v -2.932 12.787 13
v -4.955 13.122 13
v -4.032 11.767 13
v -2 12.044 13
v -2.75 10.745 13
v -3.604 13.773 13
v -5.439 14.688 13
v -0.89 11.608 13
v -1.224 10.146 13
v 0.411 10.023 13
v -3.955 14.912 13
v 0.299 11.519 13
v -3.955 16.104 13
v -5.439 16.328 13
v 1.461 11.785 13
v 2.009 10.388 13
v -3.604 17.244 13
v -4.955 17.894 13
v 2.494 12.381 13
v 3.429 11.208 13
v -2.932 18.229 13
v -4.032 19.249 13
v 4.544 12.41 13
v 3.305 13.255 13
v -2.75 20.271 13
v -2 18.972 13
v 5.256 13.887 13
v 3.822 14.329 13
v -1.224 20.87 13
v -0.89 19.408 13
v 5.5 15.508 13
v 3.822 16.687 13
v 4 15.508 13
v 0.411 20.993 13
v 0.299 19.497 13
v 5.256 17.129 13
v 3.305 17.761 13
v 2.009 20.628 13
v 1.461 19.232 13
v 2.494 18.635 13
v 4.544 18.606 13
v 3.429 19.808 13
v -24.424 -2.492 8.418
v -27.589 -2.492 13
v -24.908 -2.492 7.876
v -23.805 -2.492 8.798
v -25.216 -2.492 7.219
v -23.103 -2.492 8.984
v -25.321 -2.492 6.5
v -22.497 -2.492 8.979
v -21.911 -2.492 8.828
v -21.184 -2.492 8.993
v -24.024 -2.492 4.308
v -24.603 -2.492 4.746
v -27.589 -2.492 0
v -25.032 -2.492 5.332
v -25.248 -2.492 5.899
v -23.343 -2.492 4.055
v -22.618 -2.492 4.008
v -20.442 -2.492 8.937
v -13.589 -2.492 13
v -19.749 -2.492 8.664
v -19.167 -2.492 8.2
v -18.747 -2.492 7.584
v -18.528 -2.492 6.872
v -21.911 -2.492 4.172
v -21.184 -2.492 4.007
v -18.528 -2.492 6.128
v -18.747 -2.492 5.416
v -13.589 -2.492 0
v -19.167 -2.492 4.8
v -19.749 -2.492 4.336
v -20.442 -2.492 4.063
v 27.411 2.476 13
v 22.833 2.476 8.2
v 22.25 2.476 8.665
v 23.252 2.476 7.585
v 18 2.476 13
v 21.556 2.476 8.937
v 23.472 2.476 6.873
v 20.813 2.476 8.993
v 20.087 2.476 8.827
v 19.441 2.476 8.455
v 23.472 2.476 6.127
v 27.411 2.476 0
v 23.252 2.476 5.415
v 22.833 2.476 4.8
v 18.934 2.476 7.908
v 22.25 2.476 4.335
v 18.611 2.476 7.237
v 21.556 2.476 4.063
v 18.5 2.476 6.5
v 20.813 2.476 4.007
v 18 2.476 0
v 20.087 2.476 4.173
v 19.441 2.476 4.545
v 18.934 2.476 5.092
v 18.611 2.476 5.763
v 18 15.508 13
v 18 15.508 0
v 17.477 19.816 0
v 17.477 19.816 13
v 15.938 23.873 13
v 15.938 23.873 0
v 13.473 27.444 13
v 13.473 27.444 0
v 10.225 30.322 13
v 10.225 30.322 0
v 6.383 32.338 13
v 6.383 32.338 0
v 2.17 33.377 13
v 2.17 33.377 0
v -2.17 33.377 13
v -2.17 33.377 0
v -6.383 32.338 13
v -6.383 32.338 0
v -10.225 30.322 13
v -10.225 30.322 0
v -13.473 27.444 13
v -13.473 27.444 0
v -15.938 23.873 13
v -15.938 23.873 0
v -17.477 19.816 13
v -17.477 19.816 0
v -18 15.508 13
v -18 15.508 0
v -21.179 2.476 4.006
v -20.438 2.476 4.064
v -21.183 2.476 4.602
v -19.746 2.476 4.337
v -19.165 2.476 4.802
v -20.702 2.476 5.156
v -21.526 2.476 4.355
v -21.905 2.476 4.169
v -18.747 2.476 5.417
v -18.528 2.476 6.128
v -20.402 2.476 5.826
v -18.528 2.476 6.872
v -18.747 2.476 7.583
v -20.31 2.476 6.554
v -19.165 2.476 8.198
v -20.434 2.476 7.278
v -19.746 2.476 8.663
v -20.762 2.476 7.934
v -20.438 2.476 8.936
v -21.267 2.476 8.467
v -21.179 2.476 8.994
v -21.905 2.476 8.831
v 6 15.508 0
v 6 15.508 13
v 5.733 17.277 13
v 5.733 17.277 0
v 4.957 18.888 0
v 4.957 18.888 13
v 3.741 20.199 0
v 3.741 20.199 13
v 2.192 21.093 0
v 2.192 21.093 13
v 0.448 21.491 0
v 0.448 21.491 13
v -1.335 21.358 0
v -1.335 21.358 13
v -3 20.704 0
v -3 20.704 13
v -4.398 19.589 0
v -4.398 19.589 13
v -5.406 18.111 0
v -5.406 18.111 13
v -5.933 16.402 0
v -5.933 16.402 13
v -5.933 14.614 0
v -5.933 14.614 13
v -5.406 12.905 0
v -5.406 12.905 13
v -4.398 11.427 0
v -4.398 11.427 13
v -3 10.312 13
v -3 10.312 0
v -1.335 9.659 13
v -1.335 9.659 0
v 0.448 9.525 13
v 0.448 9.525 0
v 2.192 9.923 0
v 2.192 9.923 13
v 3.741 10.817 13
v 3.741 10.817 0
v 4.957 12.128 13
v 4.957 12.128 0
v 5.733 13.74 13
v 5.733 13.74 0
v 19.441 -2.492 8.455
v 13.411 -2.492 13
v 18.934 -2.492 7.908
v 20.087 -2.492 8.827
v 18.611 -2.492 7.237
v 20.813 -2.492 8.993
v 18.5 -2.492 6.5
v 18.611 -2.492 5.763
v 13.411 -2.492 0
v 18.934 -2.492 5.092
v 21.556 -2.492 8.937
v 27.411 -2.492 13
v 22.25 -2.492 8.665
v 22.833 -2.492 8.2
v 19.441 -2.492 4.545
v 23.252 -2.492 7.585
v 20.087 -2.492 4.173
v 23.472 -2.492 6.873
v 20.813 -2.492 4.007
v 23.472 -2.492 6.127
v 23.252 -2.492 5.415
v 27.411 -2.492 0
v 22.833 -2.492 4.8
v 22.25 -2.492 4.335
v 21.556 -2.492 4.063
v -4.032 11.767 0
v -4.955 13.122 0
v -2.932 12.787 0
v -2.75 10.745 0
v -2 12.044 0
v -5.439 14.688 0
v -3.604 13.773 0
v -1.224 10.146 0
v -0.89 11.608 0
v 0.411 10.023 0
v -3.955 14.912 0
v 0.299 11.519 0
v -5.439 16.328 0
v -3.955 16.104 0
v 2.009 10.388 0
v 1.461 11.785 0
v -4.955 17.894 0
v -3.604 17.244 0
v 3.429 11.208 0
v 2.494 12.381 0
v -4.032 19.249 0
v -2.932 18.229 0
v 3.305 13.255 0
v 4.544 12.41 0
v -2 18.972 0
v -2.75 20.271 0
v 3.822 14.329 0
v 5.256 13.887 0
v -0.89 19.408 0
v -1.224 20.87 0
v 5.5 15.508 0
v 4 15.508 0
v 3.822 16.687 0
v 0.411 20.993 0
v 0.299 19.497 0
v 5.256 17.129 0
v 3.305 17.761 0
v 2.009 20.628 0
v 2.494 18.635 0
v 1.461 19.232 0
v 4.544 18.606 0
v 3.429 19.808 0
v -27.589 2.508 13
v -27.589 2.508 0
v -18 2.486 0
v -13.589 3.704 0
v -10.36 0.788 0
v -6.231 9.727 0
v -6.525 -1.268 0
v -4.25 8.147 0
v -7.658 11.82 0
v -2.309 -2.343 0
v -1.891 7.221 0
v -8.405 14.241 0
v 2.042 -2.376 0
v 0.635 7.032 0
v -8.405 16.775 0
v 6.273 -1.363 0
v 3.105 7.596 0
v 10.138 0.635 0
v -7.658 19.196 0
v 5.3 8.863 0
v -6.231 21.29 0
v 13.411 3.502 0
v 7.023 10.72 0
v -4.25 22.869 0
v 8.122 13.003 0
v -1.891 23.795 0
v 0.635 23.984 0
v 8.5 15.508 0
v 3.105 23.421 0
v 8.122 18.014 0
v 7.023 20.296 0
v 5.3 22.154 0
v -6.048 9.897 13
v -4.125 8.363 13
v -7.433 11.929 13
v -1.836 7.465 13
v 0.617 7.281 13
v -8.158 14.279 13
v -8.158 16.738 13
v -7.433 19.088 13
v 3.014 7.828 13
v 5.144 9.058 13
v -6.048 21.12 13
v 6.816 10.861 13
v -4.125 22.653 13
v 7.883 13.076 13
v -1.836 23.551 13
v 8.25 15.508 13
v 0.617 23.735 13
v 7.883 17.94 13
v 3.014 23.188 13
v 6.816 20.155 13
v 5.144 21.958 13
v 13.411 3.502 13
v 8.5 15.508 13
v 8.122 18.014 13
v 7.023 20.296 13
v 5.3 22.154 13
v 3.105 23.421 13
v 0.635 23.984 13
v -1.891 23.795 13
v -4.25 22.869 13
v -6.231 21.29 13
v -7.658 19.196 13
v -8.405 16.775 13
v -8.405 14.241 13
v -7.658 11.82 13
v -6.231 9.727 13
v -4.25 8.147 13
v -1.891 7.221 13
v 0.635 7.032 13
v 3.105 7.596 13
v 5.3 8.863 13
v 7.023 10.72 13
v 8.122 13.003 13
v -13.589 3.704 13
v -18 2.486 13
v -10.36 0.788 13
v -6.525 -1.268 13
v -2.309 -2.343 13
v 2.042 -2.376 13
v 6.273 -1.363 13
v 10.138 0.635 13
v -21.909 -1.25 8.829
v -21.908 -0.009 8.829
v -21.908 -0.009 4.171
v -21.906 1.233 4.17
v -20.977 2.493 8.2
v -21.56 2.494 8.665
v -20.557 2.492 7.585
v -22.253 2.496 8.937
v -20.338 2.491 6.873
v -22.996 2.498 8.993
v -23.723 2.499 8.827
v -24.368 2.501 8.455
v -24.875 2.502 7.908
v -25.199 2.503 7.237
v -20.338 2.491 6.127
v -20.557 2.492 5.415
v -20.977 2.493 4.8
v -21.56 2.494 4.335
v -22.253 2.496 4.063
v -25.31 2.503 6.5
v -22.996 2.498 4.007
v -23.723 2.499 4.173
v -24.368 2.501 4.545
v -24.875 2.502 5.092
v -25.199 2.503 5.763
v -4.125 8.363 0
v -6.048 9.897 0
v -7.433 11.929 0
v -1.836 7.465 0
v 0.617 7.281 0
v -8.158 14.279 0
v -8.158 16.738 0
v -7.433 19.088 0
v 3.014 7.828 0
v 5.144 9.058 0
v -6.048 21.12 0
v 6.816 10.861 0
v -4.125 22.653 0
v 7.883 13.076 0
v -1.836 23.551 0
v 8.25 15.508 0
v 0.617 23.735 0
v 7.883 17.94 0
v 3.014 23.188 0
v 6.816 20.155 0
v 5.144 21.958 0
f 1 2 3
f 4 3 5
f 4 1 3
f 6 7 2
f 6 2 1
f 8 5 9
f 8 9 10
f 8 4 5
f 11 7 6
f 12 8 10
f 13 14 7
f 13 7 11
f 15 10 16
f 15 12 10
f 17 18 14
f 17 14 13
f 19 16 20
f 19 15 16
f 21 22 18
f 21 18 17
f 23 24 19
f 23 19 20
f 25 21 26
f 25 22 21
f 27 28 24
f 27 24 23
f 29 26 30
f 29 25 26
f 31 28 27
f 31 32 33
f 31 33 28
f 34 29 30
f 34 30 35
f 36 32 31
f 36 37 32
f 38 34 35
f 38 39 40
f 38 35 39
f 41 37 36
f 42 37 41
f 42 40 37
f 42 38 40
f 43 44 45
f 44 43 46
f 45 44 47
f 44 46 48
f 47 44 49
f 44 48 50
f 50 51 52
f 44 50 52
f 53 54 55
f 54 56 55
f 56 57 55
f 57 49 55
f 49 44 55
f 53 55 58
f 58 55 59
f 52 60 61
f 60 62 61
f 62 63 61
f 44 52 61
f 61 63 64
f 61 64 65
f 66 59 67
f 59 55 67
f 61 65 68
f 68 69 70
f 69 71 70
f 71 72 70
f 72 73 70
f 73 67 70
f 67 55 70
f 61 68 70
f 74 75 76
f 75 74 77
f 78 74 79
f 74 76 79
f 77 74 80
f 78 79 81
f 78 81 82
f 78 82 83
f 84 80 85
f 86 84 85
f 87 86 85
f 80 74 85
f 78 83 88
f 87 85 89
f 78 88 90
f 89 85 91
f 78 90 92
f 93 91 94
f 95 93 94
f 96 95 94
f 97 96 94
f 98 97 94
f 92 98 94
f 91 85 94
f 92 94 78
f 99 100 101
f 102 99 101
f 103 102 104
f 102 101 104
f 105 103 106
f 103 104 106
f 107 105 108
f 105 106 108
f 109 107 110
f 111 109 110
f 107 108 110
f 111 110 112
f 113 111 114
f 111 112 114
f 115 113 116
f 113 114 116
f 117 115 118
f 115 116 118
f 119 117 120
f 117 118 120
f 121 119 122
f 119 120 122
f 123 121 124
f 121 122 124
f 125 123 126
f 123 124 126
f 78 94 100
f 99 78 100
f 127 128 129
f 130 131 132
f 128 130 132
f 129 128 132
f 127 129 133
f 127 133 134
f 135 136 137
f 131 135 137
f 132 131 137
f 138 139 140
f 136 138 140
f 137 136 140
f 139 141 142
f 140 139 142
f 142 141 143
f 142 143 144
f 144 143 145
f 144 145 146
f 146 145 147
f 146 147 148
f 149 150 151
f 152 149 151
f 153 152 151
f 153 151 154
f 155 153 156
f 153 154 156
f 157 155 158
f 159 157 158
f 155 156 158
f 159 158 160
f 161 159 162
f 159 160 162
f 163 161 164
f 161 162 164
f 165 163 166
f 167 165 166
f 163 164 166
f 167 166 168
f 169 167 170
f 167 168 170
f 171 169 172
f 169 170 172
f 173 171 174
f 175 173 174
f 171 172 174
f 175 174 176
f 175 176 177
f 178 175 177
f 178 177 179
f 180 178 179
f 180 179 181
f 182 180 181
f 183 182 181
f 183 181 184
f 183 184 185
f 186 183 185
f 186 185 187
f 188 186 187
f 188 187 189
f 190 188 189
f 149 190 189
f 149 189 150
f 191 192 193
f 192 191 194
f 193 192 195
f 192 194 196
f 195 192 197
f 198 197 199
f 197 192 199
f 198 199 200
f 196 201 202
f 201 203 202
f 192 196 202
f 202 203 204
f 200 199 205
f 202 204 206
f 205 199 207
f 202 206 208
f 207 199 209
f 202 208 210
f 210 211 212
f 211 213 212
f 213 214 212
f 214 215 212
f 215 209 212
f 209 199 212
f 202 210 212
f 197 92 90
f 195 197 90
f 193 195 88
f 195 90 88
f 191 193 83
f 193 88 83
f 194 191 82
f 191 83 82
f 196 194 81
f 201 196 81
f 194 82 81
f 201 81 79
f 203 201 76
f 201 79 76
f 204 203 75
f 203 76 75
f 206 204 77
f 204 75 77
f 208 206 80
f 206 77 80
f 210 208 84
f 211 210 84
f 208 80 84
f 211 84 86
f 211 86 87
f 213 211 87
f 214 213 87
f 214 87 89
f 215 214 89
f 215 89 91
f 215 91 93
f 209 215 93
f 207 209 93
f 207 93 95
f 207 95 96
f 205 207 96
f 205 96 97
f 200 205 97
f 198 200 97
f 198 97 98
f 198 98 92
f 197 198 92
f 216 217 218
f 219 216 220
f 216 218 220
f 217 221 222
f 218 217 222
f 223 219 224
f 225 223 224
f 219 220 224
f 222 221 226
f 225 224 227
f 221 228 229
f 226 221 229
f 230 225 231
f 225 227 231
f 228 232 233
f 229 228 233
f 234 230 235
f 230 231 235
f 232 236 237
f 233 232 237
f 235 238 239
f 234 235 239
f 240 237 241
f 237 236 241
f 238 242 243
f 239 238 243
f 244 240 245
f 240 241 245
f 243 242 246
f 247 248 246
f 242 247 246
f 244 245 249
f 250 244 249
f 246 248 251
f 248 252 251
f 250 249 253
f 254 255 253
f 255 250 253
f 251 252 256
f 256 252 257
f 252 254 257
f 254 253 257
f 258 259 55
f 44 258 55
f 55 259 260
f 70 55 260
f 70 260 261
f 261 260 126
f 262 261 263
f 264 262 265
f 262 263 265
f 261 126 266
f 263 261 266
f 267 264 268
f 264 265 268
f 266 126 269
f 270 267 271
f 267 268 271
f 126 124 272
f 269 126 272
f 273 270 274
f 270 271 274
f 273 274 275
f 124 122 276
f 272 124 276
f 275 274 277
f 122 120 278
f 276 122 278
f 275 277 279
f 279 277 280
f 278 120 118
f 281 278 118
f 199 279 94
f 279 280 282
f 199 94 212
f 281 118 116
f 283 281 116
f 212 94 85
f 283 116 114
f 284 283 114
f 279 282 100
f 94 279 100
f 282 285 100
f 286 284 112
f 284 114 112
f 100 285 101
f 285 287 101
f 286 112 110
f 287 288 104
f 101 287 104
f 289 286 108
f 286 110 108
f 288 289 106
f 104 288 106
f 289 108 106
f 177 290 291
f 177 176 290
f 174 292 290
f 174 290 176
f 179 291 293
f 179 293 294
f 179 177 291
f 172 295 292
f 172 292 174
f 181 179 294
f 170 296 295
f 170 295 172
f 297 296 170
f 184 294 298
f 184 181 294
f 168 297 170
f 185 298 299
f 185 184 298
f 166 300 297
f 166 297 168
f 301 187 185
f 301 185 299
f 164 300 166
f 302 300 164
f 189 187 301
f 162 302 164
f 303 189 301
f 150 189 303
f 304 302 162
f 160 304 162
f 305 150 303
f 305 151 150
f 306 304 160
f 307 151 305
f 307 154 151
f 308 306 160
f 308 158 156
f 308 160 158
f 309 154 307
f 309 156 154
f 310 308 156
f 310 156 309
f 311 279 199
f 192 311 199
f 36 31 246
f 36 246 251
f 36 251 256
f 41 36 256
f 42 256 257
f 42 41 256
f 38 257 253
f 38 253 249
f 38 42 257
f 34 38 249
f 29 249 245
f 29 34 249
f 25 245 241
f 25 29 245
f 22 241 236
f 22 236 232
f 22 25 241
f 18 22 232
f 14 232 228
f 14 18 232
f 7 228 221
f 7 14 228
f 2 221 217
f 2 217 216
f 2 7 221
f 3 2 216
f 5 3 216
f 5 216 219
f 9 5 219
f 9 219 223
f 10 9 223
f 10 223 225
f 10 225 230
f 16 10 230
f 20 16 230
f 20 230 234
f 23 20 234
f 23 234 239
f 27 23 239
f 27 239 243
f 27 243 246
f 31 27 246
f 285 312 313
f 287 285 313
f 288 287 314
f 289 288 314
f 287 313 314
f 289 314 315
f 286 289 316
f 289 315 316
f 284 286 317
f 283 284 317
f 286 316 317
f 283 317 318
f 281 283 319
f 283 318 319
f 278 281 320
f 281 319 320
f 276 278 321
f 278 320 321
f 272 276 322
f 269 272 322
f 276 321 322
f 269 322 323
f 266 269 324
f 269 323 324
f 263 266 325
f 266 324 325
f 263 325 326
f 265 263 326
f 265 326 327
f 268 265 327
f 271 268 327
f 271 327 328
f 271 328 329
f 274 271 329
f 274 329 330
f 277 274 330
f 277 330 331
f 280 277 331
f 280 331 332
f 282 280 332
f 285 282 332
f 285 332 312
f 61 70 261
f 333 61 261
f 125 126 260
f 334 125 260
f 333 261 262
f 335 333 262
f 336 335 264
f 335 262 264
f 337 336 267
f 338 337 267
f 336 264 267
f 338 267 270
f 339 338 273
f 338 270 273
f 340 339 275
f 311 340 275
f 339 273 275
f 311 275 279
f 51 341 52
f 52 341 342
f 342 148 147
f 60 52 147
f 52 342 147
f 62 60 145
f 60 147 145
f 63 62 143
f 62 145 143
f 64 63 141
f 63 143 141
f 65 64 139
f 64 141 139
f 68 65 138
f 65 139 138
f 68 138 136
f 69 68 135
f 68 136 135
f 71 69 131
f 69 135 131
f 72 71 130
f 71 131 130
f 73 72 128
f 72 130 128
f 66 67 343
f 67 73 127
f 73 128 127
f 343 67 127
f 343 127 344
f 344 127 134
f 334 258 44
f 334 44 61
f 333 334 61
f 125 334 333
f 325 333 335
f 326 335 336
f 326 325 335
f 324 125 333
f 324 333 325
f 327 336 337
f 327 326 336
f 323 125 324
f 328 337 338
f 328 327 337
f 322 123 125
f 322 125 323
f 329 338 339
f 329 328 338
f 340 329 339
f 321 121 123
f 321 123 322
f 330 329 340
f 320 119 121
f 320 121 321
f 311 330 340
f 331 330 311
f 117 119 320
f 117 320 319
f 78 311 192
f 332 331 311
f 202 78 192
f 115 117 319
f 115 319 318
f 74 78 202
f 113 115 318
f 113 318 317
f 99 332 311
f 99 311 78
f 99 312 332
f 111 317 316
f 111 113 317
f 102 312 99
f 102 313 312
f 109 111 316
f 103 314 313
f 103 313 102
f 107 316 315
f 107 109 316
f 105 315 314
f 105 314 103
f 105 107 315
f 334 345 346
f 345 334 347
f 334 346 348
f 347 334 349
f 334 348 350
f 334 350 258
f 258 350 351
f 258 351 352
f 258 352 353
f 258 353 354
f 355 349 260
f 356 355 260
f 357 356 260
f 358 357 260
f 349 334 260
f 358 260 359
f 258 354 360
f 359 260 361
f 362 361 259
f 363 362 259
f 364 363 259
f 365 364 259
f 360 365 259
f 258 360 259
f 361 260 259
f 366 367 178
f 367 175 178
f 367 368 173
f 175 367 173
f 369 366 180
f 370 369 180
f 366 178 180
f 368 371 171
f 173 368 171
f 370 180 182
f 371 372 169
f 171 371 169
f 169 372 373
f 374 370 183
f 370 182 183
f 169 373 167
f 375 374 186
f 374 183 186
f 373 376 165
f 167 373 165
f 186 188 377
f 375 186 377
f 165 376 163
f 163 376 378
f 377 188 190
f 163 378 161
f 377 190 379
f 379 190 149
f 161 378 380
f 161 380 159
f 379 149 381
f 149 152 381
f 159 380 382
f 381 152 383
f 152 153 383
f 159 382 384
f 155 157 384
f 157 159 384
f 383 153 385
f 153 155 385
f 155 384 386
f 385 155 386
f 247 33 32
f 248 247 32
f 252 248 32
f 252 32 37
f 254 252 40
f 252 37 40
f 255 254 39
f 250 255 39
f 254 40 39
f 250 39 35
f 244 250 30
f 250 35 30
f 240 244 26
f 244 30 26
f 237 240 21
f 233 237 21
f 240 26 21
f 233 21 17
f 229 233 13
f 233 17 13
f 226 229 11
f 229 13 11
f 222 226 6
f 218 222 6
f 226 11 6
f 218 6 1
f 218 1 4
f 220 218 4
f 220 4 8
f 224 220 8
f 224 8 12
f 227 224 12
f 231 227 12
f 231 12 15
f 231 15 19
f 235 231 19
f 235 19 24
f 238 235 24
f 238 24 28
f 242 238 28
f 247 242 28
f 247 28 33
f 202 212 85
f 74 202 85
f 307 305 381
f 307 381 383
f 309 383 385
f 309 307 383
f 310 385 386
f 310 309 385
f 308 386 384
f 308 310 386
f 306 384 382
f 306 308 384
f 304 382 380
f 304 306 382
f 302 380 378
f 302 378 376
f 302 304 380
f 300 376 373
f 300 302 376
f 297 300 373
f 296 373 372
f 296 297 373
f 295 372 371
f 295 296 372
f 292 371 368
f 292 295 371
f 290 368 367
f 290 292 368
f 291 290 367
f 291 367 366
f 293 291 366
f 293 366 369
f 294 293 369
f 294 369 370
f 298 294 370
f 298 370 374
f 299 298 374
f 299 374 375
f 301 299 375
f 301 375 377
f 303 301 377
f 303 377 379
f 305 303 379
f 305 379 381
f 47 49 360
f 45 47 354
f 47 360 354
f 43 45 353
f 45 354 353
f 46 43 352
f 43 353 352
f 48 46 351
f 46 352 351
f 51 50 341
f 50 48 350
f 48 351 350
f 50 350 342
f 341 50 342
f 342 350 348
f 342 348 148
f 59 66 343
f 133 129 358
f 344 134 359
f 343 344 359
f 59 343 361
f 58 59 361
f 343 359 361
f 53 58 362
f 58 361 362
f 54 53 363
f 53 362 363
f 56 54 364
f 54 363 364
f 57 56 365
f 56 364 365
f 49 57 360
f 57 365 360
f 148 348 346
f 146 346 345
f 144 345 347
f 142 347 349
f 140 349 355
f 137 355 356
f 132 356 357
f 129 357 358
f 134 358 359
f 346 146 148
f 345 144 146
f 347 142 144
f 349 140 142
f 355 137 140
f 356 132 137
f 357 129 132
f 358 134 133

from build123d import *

# Parameters (mm, degrees)
BOSS_EXTRUDE1_DEPTH = 13
SKETCH2_R           = 4
CUT_EXTRUDE1_DEPTH  = 46.30956121
SKETCH3_R           = 6
SKETCH3_R_2         = 5.5
CUT_EXTRUDE3_DEPTH  = 46.30956121
SKETCH4_R           = 8.5
SKETCH4_R_2         = 8.25
CUT_EXTRUDE4_DEPTH  = 46.30956121
SKETCH5_R           = 2.5
CUT_EXTRUDE5_DEPTH  = 13
SKETCH6_R           = 2.5
CUT_EXTRUDE6_DEPTH  = 13


with BuildPart() as part:
    # Sketch1 → Boss-Extrude1 (new body)
    with BuildSketch(Plane.XY):
        with BuildLine():
            Line((13.41081623, -2.491892385), (27.41081623, -2.491892385))
            Line((27.41081623, -2.491892385), (27.41081623, 2.475781987))
            Line((27.41081623, 2.475781987), (18, 2.475781987))
            Line((18, 2.475781987), (18, 15.508107615))
            ThreePointArc((18, 15.508107615), (0, 33.508107615), (-18, 15.508107615))
            Line((-18, 15.508107615), (-18, 2.485966445))
            Line((-18, 2.485966445), (-27.58918377, 2.508107615))
            Line((-27.58918377, 2.508107615), (-27.58918377, -2.491892385))
            Line((-27.58918377, -2.491892385), (-13.58918377, -2.491892385))
            Line((-13.58918377, -2.491892385), (-13.58918377, 3.704121659))
            ThreePointArc((-13.58918377, 3.704121659), (-0.134838052, -2.491387341), (13.41081623, 3.501858907))
            Line((13.41081623, 3.501858907), (13.41081623, -2.491892385))
        make_face()
    extrude(amount=BOSS_EXTRUDE1_DEPTH)

    # Sketch2 → Cut-Extrude1 (cut, through all)
    with BuildSketch(Plane.XY.offset(13)):
        with Locations((0, 15.508107615)):
            Circle(SKETCH2_R)
    extrude(amount=-CUT_EXTRUDE1_DEPTH, mode=Mode.SUBTRACT)

    # Sketch3 → Cut-Extrude3 (cut, through all)
    with BuildSketch(Plane.XY.offset(13)):
        with Locations((0, 15.508107615)):
            Circle(SKETCH3_R)
        with Locations((0, 15.508107615)):
            Circle(SKETCH3_R_2, mode=Mode.SUBTRACT)
    extrude(amount=-CUT_EXTRUDE3_DEPTH, mode=Mode.SUBTRACT)


with BuildPart() as cut_extrude3_piece_1:
    # of the separate pieces the step leaves, piece 1, a body of its own (cut_extrude3_pieces)
    add(part.part.solids().sort_by_distance((-13.58918377, 3.704121659, 0))[0])

    # Sketch4 → Cut-Extrude4 (cut, through all)
    with BuildSketch(Plane.XY.offset(13)):
        with Locations((0, 15.508107615)):
            Circle(SKETCH4_R)
        with Locations((0, 15.508107615)):
            Circle(SKETCH4_R_2, mode=Mode.SUBTRACT)
    extrude(amount=-CUT_EXTRUDE4_DEPTH, mode=Mode.SUBTRACT)


with BuildPart() as cut_extrude3_piece_2:
    # of the separate pieces the step leaves, piece 2, a body of its own (cut_extrude3_pieces)
    add(part.part.solids().sort_by_distance((5.5, 15.508107615, 0))[0])


with BuildPart() as cut_extrude4_piece_1:
    # of the separate pieces the step leaves, piece 1, a body of its own (cut_extrude4_pieces)
    add(cut_extrude3_piece_1.part.solids().sort_by_distance((-13.58918377, 3.704121659, 0))[0])

    # Sketch5 → Cut-Extrude5 (cut)
    with BuildSketch(Plane(origin=(0, 2.475781987, 0), x_dir=(1, 0, 0), z_dir=(0, 1, 0))):
        with Locations(Location((21, -6.5, 0), (0, 0, 180))):
            Circle(SKETCH5_R)
        with Locations(Location((-21, -6.5, 0), (0, 0, 180))):
            Circle(SKETCH5_R)
    extrude(amount=-CUT_EXTRUDE5_DEPTH, mode=Mode.SUBTRACT)

    # Sketch6 → Cut-Extrude6 (cut)
    with BuildSketch(Plane(origin=(0.005644036, 2.44439189, 0), x_dir=(0.9999973343314404, -0.002308967304544804, 0), z_dir=(0.002308967304544804, 0.9999973343314404, 0))):
        with Locations(Location((-22.815354539, -6.5, 0), (0, 0, 180))):
            Circle(SKETCH6_R)
    extrude(amount=-CUT_EXTRUDE6_DEPTH, mode=Mode.SUBTRACT)


with BuildPart() as cut_extrude4_piece_2:
    # of the separate pieces the step leaves, piece 2, a body of its own (cut_extrude4_pieces)
    add(cut_extrude3_piece_1.part.solids().sort_by_distance((8.25, 15.508107615, 0))[0])


solid = Compound([cut_extrude3_piece_2.part, cut_extrude4_piece_1.part, cut_extrude4_piece_2.part])
